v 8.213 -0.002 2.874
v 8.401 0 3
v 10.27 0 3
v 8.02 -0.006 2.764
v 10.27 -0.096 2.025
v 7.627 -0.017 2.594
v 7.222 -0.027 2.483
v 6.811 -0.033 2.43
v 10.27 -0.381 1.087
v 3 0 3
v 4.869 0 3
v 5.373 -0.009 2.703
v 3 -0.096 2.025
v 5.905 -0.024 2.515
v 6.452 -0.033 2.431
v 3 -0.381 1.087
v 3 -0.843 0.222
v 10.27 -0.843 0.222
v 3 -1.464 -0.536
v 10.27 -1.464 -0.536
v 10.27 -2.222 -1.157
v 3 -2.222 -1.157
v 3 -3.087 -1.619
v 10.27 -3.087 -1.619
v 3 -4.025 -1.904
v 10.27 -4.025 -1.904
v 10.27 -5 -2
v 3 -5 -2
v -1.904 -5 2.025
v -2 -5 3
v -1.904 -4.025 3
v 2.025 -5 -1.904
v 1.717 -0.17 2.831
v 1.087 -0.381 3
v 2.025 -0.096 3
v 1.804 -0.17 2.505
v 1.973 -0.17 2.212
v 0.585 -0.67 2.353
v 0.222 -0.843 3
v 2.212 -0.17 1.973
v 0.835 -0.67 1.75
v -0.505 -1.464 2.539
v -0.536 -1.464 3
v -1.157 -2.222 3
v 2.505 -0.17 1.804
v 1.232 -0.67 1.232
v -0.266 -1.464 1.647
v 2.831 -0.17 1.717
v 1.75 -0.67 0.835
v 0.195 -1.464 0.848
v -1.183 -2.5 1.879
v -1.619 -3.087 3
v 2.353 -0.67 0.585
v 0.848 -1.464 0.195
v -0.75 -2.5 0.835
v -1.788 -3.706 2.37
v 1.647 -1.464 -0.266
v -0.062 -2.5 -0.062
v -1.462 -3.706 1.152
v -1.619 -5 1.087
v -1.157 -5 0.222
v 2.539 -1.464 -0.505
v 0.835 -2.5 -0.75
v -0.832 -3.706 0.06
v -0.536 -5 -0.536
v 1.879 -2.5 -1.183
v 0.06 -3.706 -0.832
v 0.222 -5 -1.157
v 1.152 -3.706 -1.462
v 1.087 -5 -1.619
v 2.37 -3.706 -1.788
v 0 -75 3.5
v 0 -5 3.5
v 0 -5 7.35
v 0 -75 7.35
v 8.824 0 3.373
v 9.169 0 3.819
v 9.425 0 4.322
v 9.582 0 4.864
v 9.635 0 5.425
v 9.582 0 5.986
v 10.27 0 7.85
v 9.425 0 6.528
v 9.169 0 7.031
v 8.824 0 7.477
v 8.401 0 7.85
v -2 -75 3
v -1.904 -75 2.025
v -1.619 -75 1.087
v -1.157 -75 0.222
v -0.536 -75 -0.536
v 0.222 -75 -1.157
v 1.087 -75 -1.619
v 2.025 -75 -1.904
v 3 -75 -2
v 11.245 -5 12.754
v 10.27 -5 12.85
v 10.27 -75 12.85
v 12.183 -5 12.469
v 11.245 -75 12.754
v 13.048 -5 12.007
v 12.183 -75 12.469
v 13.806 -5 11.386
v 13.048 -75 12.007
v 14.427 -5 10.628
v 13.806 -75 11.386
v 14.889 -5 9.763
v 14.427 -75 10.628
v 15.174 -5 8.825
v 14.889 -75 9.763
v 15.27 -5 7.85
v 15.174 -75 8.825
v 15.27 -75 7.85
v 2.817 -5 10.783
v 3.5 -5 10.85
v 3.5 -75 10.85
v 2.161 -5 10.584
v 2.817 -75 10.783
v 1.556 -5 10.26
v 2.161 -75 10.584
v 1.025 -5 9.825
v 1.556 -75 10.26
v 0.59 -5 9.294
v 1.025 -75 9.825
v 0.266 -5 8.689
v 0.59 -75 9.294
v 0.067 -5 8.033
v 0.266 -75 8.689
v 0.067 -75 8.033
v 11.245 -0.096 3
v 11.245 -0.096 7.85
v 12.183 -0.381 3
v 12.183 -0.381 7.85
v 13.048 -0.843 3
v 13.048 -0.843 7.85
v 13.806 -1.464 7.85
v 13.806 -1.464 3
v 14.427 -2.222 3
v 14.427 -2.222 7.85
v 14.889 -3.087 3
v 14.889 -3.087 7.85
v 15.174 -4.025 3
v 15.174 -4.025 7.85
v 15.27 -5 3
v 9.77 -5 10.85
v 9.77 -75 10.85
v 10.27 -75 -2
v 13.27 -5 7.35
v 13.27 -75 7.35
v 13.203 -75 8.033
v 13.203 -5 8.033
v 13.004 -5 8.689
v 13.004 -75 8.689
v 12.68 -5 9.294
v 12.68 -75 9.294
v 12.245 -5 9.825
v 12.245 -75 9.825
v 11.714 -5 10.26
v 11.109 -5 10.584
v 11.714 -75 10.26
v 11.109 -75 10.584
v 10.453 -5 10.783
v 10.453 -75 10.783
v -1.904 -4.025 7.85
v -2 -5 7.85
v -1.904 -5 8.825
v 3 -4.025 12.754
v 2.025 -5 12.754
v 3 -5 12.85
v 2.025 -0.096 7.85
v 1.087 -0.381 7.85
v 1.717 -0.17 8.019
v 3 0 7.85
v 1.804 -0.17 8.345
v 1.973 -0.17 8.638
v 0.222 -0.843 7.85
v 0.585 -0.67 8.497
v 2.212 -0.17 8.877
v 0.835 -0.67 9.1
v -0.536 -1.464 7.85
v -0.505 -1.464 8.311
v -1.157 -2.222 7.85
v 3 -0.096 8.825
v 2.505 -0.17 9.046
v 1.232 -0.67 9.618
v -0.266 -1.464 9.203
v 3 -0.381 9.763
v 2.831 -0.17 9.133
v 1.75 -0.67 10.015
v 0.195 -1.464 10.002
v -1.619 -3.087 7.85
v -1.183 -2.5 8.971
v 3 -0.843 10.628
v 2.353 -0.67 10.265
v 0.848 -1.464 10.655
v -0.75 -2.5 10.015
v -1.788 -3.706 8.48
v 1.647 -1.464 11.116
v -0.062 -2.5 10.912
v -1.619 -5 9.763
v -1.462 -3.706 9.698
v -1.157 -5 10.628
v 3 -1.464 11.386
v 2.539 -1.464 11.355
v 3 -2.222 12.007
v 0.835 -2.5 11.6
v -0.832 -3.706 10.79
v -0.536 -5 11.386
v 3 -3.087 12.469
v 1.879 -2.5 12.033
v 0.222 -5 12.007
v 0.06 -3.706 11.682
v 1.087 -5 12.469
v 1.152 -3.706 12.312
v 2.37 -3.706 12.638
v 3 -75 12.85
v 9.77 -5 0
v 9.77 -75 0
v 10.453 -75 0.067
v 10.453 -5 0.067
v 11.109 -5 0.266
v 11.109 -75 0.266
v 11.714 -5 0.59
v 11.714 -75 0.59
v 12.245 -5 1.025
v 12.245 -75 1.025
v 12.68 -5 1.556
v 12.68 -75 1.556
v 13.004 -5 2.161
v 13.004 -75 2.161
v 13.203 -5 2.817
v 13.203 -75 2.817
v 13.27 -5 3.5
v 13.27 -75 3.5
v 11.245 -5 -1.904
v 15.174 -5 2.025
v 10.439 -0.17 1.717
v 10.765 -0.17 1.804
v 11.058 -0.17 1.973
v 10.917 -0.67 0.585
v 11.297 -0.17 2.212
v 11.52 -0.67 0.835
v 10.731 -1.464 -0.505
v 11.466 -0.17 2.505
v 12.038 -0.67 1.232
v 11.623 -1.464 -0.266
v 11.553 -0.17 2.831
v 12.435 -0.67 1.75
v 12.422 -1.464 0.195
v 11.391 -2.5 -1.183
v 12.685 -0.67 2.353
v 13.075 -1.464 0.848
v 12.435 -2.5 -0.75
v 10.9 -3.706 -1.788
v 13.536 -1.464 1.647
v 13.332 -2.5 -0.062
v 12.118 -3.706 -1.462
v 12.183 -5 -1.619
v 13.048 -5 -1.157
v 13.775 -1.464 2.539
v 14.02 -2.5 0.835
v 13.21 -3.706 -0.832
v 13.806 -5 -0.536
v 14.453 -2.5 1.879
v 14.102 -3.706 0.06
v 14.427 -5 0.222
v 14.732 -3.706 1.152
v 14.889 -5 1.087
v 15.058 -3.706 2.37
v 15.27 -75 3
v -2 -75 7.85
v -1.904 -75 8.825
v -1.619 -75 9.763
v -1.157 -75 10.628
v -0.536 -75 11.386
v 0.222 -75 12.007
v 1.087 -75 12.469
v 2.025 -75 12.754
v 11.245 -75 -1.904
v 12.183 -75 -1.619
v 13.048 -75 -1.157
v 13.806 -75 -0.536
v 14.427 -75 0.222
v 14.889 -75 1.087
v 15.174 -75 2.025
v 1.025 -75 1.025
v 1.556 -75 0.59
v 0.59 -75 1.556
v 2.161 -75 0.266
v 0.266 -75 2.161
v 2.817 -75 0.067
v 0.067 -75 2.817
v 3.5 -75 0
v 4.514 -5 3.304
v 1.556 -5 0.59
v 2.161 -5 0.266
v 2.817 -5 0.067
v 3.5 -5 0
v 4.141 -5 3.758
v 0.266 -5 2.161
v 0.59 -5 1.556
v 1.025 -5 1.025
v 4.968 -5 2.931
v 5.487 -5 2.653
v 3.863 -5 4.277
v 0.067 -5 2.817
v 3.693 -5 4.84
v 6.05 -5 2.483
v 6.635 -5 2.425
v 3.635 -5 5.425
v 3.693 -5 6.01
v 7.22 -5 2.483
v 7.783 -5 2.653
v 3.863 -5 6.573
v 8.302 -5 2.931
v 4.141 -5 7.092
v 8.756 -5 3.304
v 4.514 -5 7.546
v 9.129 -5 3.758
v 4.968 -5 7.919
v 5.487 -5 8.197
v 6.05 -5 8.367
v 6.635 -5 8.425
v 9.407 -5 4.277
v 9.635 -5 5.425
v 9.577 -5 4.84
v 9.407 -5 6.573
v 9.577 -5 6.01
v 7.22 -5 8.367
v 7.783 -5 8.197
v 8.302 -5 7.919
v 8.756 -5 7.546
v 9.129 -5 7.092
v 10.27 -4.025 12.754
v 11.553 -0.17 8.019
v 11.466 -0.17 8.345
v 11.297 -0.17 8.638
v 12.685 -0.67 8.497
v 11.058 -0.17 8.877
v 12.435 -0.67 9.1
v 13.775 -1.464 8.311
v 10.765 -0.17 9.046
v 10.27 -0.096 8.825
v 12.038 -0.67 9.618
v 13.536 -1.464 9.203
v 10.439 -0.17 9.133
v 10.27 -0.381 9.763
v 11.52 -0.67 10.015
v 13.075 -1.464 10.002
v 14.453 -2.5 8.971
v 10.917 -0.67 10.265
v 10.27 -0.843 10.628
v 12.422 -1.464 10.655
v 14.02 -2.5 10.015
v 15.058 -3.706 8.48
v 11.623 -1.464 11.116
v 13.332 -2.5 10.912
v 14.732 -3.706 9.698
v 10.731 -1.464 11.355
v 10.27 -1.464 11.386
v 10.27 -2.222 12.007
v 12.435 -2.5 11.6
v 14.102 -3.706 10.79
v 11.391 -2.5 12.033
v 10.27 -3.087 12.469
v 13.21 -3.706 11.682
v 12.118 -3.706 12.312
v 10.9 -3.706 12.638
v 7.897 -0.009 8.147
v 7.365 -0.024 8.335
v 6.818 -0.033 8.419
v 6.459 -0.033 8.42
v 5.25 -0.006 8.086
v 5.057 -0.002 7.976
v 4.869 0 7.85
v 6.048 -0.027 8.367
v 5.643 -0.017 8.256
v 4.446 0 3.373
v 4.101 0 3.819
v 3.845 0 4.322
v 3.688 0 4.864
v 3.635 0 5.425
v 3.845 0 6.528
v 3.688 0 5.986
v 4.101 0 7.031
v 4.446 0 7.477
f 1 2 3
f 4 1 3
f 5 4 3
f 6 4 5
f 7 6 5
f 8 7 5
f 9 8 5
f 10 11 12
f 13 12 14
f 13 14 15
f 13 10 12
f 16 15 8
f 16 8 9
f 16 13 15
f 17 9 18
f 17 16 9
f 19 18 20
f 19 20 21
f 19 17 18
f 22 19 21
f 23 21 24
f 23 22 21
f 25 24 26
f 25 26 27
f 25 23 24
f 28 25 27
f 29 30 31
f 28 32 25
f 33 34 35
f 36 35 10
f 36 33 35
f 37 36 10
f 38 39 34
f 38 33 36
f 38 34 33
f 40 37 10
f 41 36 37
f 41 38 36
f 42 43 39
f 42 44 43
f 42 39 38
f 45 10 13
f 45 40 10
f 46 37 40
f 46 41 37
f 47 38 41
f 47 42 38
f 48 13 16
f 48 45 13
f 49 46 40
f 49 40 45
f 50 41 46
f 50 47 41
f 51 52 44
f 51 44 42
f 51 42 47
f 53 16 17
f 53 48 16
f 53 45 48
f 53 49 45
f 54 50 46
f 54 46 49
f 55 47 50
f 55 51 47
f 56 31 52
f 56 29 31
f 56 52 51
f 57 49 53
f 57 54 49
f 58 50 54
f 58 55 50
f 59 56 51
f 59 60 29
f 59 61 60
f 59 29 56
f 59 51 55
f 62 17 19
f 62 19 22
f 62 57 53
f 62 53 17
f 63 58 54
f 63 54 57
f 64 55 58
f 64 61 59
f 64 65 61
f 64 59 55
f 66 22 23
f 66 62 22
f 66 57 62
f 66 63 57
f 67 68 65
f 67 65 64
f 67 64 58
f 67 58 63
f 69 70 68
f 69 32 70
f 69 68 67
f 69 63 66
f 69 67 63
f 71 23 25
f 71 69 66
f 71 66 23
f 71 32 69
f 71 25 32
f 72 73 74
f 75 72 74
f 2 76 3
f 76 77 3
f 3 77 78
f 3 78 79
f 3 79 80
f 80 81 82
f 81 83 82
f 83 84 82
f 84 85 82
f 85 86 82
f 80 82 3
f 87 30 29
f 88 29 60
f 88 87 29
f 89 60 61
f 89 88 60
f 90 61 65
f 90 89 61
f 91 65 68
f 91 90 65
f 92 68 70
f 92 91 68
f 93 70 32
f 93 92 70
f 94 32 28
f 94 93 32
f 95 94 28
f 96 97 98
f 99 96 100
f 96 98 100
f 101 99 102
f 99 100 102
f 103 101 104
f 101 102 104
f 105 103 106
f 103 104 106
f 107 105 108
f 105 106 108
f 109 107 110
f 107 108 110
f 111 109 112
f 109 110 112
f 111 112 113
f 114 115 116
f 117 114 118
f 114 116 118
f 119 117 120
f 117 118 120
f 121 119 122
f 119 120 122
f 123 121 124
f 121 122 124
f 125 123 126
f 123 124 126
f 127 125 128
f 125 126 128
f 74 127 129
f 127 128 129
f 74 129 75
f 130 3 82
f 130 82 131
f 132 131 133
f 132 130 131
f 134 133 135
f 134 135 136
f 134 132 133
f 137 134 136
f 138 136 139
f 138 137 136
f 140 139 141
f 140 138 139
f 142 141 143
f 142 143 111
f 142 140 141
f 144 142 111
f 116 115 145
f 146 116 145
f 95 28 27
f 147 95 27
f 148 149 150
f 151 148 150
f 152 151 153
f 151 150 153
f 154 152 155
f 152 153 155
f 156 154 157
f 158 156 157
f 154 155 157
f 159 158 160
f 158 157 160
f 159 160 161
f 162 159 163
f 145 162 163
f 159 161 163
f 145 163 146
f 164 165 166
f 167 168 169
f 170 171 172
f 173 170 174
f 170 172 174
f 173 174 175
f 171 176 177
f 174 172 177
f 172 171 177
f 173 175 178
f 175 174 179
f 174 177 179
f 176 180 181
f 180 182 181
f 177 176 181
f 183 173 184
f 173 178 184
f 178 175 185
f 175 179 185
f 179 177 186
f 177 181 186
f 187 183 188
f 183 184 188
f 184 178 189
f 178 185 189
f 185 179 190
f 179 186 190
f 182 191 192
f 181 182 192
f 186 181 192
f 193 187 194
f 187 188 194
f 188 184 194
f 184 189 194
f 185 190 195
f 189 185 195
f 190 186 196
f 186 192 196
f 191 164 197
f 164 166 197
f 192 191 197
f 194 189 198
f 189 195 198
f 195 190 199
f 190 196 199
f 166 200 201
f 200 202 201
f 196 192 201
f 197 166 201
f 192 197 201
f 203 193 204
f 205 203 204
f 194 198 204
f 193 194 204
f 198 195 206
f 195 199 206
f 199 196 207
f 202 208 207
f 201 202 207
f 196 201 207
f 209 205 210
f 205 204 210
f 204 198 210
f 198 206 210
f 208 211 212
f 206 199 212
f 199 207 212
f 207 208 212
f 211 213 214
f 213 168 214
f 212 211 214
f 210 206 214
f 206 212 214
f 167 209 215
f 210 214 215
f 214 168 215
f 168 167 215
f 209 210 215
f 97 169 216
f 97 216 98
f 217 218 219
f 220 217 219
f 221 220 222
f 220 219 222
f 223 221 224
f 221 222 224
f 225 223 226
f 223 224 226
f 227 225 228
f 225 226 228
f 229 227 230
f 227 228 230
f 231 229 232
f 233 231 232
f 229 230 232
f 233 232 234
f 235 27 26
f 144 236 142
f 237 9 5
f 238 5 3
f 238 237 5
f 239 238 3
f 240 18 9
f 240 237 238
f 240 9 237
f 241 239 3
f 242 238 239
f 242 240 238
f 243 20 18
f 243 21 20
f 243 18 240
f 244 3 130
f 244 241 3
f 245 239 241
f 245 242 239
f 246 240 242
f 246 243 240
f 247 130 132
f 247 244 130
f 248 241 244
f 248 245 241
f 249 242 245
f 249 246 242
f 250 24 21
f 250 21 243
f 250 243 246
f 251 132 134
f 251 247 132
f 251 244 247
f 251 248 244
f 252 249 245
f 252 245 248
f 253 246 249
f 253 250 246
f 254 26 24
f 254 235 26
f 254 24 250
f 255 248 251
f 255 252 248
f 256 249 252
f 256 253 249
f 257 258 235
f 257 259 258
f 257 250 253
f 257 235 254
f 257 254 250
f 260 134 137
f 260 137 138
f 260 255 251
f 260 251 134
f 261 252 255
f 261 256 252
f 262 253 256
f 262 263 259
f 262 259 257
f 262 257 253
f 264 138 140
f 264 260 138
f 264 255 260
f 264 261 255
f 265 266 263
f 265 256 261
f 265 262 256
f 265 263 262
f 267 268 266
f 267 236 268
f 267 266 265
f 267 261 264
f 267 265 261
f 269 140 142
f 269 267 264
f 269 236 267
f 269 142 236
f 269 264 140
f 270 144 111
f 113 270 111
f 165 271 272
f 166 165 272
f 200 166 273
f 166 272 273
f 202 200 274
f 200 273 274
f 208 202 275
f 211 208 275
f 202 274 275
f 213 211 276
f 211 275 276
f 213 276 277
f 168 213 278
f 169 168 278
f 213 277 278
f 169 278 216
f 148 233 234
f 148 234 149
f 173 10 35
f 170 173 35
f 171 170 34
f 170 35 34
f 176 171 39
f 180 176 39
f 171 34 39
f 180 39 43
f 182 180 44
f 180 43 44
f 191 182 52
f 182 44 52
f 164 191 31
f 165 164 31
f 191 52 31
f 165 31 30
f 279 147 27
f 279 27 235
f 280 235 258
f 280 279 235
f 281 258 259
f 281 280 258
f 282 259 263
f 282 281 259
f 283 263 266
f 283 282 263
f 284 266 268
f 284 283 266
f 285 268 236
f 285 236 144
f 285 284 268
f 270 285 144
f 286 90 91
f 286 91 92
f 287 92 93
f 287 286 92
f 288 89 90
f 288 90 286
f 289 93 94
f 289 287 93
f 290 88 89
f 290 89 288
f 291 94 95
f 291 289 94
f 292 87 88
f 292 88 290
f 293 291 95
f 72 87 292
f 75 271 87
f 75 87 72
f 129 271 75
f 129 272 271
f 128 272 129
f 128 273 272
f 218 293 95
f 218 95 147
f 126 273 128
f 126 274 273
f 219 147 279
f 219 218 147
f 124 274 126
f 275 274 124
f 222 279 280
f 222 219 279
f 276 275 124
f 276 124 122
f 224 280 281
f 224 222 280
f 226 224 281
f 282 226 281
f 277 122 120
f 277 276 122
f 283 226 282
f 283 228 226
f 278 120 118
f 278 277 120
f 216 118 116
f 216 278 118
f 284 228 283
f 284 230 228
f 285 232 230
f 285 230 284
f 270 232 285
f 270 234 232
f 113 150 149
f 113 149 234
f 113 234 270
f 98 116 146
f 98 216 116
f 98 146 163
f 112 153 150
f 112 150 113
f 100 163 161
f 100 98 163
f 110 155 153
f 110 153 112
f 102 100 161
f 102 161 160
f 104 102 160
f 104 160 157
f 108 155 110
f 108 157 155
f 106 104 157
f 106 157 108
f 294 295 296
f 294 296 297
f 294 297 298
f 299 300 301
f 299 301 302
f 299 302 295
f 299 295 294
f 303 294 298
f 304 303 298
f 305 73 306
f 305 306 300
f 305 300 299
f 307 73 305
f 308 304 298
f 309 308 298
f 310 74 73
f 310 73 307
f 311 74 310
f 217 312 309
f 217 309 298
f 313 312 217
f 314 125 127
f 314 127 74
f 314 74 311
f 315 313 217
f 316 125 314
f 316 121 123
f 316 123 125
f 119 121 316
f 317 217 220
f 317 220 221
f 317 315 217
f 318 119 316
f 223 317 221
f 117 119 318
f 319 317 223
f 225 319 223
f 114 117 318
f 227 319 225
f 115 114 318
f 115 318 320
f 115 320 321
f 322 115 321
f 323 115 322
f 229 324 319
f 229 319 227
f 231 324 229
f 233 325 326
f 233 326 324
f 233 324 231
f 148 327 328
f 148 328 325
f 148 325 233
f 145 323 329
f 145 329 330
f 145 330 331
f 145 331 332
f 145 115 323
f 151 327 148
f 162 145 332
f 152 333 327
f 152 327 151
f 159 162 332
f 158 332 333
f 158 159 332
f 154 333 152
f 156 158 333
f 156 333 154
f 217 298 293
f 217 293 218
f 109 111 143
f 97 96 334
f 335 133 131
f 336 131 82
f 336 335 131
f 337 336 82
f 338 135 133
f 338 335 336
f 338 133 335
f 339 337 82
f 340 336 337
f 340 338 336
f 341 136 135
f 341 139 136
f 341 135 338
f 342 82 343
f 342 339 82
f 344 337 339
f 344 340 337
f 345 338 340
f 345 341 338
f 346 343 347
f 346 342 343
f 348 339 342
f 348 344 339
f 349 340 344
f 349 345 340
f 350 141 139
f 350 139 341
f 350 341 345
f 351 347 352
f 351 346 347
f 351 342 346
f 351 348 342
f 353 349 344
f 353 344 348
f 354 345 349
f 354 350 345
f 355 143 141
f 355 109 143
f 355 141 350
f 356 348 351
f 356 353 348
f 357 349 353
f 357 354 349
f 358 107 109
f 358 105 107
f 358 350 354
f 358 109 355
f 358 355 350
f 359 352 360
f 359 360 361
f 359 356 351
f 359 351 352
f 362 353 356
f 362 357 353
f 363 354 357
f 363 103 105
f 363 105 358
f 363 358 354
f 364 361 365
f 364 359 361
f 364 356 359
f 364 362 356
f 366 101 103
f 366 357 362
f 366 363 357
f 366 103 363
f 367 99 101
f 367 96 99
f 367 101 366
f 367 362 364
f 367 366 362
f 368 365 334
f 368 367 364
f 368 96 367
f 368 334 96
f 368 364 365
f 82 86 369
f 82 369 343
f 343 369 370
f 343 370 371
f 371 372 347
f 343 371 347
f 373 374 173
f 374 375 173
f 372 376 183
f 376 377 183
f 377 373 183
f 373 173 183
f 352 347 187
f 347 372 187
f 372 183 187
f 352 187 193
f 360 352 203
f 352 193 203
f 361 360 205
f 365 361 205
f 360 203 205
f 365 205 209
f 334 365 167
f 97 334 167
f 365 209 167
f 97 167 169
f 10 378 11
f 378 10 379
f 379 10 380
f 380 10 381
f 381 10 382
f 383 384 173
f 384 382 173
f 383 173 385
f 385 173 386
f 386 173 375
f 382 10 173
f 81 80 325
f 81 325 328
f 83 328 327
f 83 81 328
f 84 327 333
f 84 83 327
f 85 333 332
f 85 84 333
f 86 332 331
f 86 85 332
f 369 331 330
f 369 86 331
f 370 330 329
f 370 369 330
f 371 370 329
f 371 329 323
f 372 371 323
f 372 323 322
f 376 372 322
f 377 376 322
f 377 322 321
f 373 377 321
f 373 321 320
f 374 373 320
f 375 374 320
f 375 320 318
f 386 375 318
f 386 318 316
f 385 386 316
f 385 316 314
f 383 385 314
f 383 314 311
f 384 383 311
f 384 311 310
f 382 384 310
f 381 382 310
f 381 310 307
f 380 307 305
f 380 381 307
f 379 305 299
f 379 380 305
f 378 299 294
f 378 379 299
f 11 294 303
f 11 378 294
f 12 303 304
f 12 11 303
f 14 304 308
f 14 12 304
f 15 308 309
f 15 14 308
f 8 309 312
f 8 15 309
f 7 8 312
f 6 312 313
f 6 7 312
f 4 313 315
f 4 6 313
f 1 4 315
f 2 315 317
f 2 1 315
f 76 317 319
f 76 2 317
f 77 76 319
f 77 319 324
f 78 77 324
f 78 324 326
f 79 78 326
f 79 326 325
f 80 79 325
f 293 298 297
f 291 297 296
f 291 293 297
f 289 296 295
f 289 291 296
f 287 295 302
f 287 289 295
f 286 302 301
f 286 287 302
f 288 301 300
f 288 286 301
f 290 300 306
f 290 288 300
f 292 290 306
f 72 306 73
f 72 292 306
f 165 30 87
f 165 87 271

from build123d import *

# Parameters (mm, degrees)
F0_W         = 17.27
F0_H         = 14.85
F0_W_2       = 13.27
F0_H_2       = 10.85
F1_DEPTH     = 75
F2_R         = 3.5
F3_R         = 5
F4_W         = 13.27
F4_H         = 10.85
F5_DEPTH     = 5
F6_R         = 3
F7_DEPTH     = 25
F8_T1_DEPTH  = 7.27
F8_T3_DEPTH  = 4.85
F8_T6_ANGLE  = 90
F8_T8_ANGLE  = 90
F8_T10_ANGLE = 90
F8_T12_ANGLE = 90


# Not quite as in the source:
# - a fillet or chamfer that OpenCascade refuses, or shapes differently, is made with other operations: its cross-section is extruded or revolved along the edge and cut away or added


with BuildPart() as f1:
    # F0 (on Front) → F1 (new body)
    with BuildSketch(Plane.XZ):
        with Locations((6.635, 5.425)):
            Rectangle(F0_W, F0_H)
        with Locations((6.635, 5.425)):
            Rectangle(F0_W_2, F0_H_2, mode=Mode.SUBTRACT)
    extrude(amount=F1_DEPTH)

    # F2
    f2_edges = [f1.edges().sort_by_distance(p)[0] for p in [
        (0, -37.5, 10.85),
        (13.27, -37.5, 0),
        (13.27, -37.5, 10.85),
        (0, -37.5, 0),
    ]]
    fillet(f2_edges, radius=F2_R)

    # F3
    f3_edges = [f1.edges().sort_by_distance(p)[0] for p in [
        (-2, -37.5, 12.85),
        (15.27, -37.5, 12.85),
        (15.27, -37.5, -2),
        (-2, -37.5, -2),
    ]]
    fillet(f3_edges, radius=F3_R)

    # F4 (on face) → F5 (join)
    with BuildSketch(Plane.XZ):
        with Locations((6.635, 5.425)):
            Rectangle(F4_W, F4_H)
    extrude(amount=F5_DEPTH)

    # F6 (on face) → F7 (cut)
    with BuildSketch(Plane.XZ):
        with Locations((6.635, 5.425)):
            Circle(F6_R)
    extrude(amount=F7_DEPTH, mode=Mode.SUBTRACT)

    # F8: fillet of radius 5 on 8 edges, made by hand

    # F8_s2 → F8_t1 (cut)
    with BuildSketch(Plane.YZ.offset(3)):
        with BuildLine():
            ThreePointArc((0, 7.85), (-1.4644660941, 11.3855339059), (-5, 12.85))
            Line((-5, 12.85), (0, 12.85))
            Line((0, 12.85), (0, 7.85))
        make_face()
        with BuildLine():
            ThreePointArc((0, 3), (-1.4644660941, -0.5355339059), (-5, -2))
            Line((-5, -2), (0, -2))
            Line((0, -2), (0, 3))
        make_face()
    extrude(amount=F8_T1_DEPTH, mode=Mode.SUBTRACT)

    # F8_s4 → F8_t3 (cut)
    with BuildSketch(Plane.XY.offset(3)):
        with BuildLine():
            ThreePointArc((3, 0), (-0.5355339059, -1.4644660941), (-2, -5))
            Line((-2, -5), (-2, 0))
            Line((-2, 0), (3, 0))
        make_face()
        with BuildLine():
            ThreePointArc((10.27, 0), (13.8055339059, -1.4644660941), (15.27, -5))
            Line((15.27, -5), (15.27, 0))
            Line((15.27, 0), (10.27, 0))
        make_face()
    extrude(amount=F8_T3_DEPTH, mode=Mode.SUBTRACT)

    # F8_s5 → F8_t6 (revolve, cut)
    with BuildSketch(Plane.XY.offset(7.85)):
        with BuildLine():
            ThreePointArc((3, 0), (-0.5355339059, -1.4644660941), (-2, -5))
            Line((-2, -5), (-2, 0))
            Line((-2, 0), (3, 0))
        make_face()
    revolve(axis=Axis((3, 0, 7.85), (0, 1, 0)), revolution_arc=F8_T6_ANGLE, mode=Mode.SUBTRACT)

    # F8_s7 → F8_t8 (revolve, cut)
    with BuildSketch(Plane.XY.offset(3)):
        with BuildLine():
            ThreePointArc((3, 0), (-0.5355339059, -1.4644660941), (-2, -5))
            Line((-2, -5), (-2, 0))
            Line((-2, 0), (3, 0))
        make_face()
    revolve(axis=Axis((3, 0, 3), (0, -1, 0)), revolution_arc=F8_T8_ANGLE, mode=Mode.SUBTRACT)

    # F8_s9 → F8_t10 (revolve, cut)
    with BuildSketch(Plane.XY.offset(7.85)):
        with BuildLine():
            ThreePointArc((10.27, 0), (13.8055339059, -1.4644660941), (15.27, -5))
            Line((15.27, -5), (15.27, 0))
            Line((15.27, 0), (10.27, 0))
        make_face()
    revolve(axis=Axis((10.27, 0, 7.85), (0, -1, 0)), revolution_arc=F8_T10_ANGLE, mode=Mode.SUBTRACT)

    # F8_s11 → F8_t12 (revolve, cut)
    with BuildSketch(Plane.YZ.offset(10.27)):
        with BuildLine():
            ThreePointArc((0, 3), (-1.4644660941, -0.5355339059), (-5, -2))
            Line((-5, -2), (0, -2))
            Line((0, -2), (0, 3))
        make_face()
    revolve(axis=Axis((10.27, 0, 3), (0, -1, 0)), revolution_arc=F8_T12_ANGLE, mode=Mode.SUBTRACT)


solid = f1.part
